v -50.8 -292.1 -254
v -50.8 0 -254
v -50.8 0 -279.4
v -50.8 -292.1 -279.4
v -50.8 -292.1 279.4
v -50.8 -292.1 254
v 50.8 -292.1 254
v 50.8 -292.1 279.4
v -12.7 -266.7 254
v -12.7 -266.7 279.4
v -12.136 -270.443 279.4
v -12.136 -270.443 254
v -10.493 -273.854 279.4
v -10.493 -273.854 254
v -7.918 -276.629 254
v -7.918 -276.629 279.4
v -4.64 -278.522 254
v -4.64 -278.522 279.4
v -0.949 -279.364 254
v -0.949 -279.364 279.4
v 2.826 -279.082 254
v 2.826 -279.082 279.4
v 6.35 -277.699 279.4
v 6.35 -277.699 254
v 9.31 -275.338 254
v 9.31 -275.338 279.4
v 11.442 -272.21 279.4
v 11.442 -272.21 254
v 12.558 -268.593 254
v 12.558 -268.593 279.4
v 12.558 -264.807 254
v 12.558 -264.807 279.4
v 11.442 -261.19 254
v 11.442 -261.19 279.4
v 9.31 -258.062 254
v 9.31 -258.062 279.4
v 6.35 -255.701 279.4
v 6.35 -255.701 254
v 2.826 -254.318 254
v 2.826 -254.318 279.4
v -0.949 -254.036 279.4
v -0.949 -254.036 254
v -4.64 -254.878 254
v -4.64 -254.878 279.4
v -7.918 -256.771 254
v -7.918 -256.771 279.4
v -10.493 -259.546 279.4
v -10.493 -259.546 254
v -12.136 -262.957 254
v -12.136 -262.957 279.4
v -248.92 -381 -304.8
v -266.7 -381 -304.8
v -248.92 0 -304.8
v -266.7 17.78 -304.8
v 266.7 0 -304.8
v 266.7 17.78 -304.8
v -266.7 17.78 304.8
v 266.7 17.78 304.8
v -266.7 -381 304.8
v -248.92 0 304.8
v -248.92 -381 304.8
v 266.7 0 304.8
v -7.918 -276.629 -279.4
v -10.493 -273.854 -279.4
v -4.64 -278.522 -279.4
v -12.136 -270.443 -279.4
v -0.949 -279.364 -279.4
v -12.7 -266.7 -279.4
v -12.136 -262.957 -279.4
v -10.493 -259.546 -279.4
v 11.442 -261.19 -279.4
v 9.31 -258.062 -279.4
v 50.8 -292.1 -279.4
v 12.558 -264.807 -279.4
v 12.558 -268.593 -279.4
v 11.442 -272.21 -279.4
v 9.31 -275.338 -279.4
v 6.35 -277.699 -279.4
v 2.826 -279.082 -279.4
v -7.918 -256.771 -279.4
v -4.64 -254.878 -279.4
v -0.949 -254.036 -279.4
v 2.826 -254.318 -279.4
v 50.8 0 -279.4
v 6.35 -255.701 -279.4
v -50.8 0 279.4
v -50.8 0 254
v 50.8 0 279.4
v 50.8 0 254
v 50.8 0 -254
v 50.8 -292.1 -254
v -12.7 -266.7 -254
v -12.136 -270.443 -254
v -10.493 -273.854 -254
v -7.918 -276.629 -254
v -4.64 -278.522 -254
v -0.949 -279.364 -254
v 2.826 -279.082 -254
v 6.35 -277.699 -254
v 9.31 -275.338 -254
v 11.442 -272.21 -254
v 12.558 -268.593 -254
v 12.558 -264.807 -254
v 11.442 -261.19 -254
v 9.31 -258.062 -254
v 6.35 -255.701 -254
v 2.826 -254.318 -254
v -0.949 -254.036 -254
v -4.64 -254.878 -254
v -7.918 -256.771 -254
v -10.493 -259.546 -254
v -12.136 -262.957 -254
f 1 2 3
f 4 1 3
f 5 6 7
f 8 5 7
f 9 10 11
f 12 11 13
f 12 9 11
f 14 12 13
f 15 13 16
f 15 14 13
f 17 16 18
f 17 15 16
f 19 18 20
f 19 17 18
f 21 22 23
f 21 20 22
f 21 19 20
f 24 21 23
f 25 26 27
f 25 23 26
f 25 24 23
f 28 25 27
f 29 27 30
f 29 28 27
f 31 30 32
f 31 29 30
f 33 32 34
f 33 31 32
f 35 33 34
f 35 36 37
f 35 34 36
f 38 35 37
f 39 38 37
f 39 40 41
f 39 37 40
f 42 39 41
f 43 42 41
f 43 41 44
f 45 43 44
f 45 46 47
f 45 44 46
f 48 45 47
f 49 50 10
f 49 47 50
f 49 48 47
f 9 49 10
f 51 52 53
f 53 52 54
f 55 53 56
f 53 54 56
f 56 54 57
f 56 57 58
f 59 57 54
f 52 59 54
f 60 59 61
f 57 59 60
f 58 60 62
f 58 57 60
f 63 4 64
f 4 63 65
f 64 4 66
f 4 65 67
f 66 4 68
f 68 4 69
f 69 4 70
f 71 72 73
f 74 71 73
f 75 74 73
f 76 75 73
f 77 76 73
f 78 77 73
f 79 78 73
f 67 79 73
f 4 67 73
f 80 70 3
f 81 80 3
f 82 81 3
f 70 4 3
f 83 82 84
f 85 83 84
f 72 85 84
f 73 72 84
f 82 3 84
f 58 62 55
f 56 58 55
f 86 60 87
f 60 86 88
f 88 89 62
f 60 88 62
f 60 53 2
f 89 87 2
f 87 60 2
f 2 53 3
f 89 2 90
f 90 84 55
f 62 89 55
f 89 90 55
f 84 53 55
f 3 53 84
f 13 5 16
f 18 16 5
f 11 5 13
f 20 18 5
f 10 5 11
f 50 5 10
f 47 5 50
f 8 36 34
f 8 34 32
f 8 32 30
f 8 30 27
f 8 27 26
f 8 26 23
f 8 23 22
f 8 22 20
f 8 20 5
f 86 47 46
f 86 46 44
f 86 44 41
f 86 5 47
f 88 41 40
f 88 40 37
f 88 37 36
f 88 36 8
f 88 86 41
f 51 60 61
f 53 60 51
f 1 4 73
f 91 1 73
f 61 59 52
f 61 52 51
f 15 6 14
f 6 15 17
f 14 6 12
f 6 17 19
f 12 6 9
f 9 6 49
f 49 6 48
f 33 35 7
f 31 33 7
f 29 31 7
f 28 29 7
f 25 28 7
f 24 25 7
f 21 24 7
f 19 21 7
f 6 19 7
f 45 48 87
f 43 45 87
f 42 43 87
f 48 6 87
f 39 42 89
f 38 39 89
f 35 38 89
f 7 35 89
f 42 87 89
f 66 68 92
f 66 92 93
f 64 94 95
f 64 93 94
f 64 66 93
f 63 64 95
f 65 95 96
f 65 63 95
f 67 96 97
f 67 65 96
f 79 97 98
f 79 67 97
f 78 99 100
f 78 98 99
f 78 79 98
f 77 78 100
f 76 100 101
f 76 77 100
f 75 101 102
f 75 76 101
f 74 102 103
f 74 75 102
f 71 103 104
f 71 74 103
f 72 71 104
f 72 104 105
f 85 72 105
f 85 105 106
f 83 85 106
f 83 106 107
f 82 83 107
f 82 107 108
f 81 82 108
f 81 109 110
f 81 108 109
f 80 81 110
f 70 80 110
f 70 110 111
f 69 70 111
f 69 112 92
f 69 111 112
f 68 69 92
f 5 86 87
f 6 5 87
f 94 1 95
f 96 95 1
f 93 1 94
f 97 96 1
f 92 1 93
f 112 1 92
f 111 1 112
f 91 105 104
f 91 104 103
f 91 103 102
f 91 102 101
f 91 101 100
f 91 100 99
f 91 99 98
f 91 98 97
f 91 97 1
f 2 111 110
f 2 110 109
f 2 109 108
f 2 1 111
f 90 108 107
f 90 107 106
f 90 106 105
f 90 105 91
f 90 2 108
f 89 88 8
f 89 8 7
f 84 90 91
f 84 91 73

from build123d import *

# Parameters (mm, degrees)
SKETCH2_W               = 533.4
SKETCH2_H               = 609.6
SKETCH2_W_2             = 101.6
SKETCH2_H_2             = 25.4
BOSS_EXTRUDE1_DEPTH     = 17.78
SKETCH3_W               = 101.6
SKETCH3_H               = 25.4
BOSS_EXTRUDE2_DEPTH     = 17.78
SKETCH3_2_W             = 101.6
SKETCH3_2_H             = 25.4
BOSS_EXTRUDE3_DEPTH     = 292.1
CUT_EXTRUDE1_DEPTH      = 508
CUT_EXTRUDE1_DEPTH_BACK = 508
SKETCH4_R               = 12.7
SKETCH5_W               = 17.78
SKETCH5_H               = 609.6
BOSS_EXTRUDE4_DEPTH     = 381


with BuildPart() as part:
    # Sketch2 → Boss-Extrude1 (new body)
    with BuildSketch(Plane(origin=(0, 0, 0), x_dir=(1, 0, 0), z_dir=(0, 1, 0))):
        Rectangle(SKETCH2_W, SKETCH2_H)
        with Locations((0, -266.7)):
            Rectangle(SKETCH2_W_2, SKETCH2_H_2, mode=Mode.SUBTRACT)
        with Locations((0, 266.7)):
            Rectangle(SKETCH2_W_2, SKETCH2_H_2, mode=Mode.SUBTRACT)
    extrude(amount=BOSS_EXTRUDE1_DEPTH)

    # Sketch3 → Boss-Extrude2 (add)
    with BuildSketch(Plane(origin=(0, 0, 0), x_dir=(1, 0, 0), z_dir=(0, 1, 0))):
        with Locations((0, -266.7)):
            Rectangle(SKETCH3_W, SKETCH3_H)
        with Locations((0, 266.7)):
            Rectangle(SKETCH3_W, SKETCH3_H)
    extrude(amount=BOSS_EXTRUDE2_DEPTH)

    # Sketch3<2> → Boss-Extrude3 (add)
    with BuildSketch(Plane(origin=(0, 0, 0), x_dir=(1, 0, 0), z_dir=(0, 1, 0))):
        with Locations((0, -266.7)):
            Rectangle(SKETCH3_2_W, SKETCH3_2_H)
        with Locations((0, 266.7)):
            Rectangle(SKETCH3_2_W, SKETCH3_2_H)
    extrude(amount=-BOSS_EXTRUDE3_DEPTH)

    # Sketch4 → Cut-Extrude1 (cut, two sides: drawn at the far end of the back side and taken through both)
    with BuildSketch(Plane.XY.offset(-CUT_EXTRUDE1_DEPTH_BACK)):
        with Locations((0, -266.7)):
            Circle(SKETCH4_R)
    extrude(amount=CUT_EXTRUDE1_DEPTH + CUT_EXTRUDE1_DEPTH_BACK, mode=Mode.SUBTRACT)

    # Sketch5 → Boss-Extrude4 (add)
    with BuildSketch(Plane(origin=(0, 0, 0), x_dir=(1, 0, 0), z_dir=(0, 1, 0))):
        with Locations((-257.81, 0)):
            Rectangle(SKETCH5_W, SKETCH5_H)
    extrude(amount=-BOSS_EXTRUDE4_DEPTH)


solid = part.part
